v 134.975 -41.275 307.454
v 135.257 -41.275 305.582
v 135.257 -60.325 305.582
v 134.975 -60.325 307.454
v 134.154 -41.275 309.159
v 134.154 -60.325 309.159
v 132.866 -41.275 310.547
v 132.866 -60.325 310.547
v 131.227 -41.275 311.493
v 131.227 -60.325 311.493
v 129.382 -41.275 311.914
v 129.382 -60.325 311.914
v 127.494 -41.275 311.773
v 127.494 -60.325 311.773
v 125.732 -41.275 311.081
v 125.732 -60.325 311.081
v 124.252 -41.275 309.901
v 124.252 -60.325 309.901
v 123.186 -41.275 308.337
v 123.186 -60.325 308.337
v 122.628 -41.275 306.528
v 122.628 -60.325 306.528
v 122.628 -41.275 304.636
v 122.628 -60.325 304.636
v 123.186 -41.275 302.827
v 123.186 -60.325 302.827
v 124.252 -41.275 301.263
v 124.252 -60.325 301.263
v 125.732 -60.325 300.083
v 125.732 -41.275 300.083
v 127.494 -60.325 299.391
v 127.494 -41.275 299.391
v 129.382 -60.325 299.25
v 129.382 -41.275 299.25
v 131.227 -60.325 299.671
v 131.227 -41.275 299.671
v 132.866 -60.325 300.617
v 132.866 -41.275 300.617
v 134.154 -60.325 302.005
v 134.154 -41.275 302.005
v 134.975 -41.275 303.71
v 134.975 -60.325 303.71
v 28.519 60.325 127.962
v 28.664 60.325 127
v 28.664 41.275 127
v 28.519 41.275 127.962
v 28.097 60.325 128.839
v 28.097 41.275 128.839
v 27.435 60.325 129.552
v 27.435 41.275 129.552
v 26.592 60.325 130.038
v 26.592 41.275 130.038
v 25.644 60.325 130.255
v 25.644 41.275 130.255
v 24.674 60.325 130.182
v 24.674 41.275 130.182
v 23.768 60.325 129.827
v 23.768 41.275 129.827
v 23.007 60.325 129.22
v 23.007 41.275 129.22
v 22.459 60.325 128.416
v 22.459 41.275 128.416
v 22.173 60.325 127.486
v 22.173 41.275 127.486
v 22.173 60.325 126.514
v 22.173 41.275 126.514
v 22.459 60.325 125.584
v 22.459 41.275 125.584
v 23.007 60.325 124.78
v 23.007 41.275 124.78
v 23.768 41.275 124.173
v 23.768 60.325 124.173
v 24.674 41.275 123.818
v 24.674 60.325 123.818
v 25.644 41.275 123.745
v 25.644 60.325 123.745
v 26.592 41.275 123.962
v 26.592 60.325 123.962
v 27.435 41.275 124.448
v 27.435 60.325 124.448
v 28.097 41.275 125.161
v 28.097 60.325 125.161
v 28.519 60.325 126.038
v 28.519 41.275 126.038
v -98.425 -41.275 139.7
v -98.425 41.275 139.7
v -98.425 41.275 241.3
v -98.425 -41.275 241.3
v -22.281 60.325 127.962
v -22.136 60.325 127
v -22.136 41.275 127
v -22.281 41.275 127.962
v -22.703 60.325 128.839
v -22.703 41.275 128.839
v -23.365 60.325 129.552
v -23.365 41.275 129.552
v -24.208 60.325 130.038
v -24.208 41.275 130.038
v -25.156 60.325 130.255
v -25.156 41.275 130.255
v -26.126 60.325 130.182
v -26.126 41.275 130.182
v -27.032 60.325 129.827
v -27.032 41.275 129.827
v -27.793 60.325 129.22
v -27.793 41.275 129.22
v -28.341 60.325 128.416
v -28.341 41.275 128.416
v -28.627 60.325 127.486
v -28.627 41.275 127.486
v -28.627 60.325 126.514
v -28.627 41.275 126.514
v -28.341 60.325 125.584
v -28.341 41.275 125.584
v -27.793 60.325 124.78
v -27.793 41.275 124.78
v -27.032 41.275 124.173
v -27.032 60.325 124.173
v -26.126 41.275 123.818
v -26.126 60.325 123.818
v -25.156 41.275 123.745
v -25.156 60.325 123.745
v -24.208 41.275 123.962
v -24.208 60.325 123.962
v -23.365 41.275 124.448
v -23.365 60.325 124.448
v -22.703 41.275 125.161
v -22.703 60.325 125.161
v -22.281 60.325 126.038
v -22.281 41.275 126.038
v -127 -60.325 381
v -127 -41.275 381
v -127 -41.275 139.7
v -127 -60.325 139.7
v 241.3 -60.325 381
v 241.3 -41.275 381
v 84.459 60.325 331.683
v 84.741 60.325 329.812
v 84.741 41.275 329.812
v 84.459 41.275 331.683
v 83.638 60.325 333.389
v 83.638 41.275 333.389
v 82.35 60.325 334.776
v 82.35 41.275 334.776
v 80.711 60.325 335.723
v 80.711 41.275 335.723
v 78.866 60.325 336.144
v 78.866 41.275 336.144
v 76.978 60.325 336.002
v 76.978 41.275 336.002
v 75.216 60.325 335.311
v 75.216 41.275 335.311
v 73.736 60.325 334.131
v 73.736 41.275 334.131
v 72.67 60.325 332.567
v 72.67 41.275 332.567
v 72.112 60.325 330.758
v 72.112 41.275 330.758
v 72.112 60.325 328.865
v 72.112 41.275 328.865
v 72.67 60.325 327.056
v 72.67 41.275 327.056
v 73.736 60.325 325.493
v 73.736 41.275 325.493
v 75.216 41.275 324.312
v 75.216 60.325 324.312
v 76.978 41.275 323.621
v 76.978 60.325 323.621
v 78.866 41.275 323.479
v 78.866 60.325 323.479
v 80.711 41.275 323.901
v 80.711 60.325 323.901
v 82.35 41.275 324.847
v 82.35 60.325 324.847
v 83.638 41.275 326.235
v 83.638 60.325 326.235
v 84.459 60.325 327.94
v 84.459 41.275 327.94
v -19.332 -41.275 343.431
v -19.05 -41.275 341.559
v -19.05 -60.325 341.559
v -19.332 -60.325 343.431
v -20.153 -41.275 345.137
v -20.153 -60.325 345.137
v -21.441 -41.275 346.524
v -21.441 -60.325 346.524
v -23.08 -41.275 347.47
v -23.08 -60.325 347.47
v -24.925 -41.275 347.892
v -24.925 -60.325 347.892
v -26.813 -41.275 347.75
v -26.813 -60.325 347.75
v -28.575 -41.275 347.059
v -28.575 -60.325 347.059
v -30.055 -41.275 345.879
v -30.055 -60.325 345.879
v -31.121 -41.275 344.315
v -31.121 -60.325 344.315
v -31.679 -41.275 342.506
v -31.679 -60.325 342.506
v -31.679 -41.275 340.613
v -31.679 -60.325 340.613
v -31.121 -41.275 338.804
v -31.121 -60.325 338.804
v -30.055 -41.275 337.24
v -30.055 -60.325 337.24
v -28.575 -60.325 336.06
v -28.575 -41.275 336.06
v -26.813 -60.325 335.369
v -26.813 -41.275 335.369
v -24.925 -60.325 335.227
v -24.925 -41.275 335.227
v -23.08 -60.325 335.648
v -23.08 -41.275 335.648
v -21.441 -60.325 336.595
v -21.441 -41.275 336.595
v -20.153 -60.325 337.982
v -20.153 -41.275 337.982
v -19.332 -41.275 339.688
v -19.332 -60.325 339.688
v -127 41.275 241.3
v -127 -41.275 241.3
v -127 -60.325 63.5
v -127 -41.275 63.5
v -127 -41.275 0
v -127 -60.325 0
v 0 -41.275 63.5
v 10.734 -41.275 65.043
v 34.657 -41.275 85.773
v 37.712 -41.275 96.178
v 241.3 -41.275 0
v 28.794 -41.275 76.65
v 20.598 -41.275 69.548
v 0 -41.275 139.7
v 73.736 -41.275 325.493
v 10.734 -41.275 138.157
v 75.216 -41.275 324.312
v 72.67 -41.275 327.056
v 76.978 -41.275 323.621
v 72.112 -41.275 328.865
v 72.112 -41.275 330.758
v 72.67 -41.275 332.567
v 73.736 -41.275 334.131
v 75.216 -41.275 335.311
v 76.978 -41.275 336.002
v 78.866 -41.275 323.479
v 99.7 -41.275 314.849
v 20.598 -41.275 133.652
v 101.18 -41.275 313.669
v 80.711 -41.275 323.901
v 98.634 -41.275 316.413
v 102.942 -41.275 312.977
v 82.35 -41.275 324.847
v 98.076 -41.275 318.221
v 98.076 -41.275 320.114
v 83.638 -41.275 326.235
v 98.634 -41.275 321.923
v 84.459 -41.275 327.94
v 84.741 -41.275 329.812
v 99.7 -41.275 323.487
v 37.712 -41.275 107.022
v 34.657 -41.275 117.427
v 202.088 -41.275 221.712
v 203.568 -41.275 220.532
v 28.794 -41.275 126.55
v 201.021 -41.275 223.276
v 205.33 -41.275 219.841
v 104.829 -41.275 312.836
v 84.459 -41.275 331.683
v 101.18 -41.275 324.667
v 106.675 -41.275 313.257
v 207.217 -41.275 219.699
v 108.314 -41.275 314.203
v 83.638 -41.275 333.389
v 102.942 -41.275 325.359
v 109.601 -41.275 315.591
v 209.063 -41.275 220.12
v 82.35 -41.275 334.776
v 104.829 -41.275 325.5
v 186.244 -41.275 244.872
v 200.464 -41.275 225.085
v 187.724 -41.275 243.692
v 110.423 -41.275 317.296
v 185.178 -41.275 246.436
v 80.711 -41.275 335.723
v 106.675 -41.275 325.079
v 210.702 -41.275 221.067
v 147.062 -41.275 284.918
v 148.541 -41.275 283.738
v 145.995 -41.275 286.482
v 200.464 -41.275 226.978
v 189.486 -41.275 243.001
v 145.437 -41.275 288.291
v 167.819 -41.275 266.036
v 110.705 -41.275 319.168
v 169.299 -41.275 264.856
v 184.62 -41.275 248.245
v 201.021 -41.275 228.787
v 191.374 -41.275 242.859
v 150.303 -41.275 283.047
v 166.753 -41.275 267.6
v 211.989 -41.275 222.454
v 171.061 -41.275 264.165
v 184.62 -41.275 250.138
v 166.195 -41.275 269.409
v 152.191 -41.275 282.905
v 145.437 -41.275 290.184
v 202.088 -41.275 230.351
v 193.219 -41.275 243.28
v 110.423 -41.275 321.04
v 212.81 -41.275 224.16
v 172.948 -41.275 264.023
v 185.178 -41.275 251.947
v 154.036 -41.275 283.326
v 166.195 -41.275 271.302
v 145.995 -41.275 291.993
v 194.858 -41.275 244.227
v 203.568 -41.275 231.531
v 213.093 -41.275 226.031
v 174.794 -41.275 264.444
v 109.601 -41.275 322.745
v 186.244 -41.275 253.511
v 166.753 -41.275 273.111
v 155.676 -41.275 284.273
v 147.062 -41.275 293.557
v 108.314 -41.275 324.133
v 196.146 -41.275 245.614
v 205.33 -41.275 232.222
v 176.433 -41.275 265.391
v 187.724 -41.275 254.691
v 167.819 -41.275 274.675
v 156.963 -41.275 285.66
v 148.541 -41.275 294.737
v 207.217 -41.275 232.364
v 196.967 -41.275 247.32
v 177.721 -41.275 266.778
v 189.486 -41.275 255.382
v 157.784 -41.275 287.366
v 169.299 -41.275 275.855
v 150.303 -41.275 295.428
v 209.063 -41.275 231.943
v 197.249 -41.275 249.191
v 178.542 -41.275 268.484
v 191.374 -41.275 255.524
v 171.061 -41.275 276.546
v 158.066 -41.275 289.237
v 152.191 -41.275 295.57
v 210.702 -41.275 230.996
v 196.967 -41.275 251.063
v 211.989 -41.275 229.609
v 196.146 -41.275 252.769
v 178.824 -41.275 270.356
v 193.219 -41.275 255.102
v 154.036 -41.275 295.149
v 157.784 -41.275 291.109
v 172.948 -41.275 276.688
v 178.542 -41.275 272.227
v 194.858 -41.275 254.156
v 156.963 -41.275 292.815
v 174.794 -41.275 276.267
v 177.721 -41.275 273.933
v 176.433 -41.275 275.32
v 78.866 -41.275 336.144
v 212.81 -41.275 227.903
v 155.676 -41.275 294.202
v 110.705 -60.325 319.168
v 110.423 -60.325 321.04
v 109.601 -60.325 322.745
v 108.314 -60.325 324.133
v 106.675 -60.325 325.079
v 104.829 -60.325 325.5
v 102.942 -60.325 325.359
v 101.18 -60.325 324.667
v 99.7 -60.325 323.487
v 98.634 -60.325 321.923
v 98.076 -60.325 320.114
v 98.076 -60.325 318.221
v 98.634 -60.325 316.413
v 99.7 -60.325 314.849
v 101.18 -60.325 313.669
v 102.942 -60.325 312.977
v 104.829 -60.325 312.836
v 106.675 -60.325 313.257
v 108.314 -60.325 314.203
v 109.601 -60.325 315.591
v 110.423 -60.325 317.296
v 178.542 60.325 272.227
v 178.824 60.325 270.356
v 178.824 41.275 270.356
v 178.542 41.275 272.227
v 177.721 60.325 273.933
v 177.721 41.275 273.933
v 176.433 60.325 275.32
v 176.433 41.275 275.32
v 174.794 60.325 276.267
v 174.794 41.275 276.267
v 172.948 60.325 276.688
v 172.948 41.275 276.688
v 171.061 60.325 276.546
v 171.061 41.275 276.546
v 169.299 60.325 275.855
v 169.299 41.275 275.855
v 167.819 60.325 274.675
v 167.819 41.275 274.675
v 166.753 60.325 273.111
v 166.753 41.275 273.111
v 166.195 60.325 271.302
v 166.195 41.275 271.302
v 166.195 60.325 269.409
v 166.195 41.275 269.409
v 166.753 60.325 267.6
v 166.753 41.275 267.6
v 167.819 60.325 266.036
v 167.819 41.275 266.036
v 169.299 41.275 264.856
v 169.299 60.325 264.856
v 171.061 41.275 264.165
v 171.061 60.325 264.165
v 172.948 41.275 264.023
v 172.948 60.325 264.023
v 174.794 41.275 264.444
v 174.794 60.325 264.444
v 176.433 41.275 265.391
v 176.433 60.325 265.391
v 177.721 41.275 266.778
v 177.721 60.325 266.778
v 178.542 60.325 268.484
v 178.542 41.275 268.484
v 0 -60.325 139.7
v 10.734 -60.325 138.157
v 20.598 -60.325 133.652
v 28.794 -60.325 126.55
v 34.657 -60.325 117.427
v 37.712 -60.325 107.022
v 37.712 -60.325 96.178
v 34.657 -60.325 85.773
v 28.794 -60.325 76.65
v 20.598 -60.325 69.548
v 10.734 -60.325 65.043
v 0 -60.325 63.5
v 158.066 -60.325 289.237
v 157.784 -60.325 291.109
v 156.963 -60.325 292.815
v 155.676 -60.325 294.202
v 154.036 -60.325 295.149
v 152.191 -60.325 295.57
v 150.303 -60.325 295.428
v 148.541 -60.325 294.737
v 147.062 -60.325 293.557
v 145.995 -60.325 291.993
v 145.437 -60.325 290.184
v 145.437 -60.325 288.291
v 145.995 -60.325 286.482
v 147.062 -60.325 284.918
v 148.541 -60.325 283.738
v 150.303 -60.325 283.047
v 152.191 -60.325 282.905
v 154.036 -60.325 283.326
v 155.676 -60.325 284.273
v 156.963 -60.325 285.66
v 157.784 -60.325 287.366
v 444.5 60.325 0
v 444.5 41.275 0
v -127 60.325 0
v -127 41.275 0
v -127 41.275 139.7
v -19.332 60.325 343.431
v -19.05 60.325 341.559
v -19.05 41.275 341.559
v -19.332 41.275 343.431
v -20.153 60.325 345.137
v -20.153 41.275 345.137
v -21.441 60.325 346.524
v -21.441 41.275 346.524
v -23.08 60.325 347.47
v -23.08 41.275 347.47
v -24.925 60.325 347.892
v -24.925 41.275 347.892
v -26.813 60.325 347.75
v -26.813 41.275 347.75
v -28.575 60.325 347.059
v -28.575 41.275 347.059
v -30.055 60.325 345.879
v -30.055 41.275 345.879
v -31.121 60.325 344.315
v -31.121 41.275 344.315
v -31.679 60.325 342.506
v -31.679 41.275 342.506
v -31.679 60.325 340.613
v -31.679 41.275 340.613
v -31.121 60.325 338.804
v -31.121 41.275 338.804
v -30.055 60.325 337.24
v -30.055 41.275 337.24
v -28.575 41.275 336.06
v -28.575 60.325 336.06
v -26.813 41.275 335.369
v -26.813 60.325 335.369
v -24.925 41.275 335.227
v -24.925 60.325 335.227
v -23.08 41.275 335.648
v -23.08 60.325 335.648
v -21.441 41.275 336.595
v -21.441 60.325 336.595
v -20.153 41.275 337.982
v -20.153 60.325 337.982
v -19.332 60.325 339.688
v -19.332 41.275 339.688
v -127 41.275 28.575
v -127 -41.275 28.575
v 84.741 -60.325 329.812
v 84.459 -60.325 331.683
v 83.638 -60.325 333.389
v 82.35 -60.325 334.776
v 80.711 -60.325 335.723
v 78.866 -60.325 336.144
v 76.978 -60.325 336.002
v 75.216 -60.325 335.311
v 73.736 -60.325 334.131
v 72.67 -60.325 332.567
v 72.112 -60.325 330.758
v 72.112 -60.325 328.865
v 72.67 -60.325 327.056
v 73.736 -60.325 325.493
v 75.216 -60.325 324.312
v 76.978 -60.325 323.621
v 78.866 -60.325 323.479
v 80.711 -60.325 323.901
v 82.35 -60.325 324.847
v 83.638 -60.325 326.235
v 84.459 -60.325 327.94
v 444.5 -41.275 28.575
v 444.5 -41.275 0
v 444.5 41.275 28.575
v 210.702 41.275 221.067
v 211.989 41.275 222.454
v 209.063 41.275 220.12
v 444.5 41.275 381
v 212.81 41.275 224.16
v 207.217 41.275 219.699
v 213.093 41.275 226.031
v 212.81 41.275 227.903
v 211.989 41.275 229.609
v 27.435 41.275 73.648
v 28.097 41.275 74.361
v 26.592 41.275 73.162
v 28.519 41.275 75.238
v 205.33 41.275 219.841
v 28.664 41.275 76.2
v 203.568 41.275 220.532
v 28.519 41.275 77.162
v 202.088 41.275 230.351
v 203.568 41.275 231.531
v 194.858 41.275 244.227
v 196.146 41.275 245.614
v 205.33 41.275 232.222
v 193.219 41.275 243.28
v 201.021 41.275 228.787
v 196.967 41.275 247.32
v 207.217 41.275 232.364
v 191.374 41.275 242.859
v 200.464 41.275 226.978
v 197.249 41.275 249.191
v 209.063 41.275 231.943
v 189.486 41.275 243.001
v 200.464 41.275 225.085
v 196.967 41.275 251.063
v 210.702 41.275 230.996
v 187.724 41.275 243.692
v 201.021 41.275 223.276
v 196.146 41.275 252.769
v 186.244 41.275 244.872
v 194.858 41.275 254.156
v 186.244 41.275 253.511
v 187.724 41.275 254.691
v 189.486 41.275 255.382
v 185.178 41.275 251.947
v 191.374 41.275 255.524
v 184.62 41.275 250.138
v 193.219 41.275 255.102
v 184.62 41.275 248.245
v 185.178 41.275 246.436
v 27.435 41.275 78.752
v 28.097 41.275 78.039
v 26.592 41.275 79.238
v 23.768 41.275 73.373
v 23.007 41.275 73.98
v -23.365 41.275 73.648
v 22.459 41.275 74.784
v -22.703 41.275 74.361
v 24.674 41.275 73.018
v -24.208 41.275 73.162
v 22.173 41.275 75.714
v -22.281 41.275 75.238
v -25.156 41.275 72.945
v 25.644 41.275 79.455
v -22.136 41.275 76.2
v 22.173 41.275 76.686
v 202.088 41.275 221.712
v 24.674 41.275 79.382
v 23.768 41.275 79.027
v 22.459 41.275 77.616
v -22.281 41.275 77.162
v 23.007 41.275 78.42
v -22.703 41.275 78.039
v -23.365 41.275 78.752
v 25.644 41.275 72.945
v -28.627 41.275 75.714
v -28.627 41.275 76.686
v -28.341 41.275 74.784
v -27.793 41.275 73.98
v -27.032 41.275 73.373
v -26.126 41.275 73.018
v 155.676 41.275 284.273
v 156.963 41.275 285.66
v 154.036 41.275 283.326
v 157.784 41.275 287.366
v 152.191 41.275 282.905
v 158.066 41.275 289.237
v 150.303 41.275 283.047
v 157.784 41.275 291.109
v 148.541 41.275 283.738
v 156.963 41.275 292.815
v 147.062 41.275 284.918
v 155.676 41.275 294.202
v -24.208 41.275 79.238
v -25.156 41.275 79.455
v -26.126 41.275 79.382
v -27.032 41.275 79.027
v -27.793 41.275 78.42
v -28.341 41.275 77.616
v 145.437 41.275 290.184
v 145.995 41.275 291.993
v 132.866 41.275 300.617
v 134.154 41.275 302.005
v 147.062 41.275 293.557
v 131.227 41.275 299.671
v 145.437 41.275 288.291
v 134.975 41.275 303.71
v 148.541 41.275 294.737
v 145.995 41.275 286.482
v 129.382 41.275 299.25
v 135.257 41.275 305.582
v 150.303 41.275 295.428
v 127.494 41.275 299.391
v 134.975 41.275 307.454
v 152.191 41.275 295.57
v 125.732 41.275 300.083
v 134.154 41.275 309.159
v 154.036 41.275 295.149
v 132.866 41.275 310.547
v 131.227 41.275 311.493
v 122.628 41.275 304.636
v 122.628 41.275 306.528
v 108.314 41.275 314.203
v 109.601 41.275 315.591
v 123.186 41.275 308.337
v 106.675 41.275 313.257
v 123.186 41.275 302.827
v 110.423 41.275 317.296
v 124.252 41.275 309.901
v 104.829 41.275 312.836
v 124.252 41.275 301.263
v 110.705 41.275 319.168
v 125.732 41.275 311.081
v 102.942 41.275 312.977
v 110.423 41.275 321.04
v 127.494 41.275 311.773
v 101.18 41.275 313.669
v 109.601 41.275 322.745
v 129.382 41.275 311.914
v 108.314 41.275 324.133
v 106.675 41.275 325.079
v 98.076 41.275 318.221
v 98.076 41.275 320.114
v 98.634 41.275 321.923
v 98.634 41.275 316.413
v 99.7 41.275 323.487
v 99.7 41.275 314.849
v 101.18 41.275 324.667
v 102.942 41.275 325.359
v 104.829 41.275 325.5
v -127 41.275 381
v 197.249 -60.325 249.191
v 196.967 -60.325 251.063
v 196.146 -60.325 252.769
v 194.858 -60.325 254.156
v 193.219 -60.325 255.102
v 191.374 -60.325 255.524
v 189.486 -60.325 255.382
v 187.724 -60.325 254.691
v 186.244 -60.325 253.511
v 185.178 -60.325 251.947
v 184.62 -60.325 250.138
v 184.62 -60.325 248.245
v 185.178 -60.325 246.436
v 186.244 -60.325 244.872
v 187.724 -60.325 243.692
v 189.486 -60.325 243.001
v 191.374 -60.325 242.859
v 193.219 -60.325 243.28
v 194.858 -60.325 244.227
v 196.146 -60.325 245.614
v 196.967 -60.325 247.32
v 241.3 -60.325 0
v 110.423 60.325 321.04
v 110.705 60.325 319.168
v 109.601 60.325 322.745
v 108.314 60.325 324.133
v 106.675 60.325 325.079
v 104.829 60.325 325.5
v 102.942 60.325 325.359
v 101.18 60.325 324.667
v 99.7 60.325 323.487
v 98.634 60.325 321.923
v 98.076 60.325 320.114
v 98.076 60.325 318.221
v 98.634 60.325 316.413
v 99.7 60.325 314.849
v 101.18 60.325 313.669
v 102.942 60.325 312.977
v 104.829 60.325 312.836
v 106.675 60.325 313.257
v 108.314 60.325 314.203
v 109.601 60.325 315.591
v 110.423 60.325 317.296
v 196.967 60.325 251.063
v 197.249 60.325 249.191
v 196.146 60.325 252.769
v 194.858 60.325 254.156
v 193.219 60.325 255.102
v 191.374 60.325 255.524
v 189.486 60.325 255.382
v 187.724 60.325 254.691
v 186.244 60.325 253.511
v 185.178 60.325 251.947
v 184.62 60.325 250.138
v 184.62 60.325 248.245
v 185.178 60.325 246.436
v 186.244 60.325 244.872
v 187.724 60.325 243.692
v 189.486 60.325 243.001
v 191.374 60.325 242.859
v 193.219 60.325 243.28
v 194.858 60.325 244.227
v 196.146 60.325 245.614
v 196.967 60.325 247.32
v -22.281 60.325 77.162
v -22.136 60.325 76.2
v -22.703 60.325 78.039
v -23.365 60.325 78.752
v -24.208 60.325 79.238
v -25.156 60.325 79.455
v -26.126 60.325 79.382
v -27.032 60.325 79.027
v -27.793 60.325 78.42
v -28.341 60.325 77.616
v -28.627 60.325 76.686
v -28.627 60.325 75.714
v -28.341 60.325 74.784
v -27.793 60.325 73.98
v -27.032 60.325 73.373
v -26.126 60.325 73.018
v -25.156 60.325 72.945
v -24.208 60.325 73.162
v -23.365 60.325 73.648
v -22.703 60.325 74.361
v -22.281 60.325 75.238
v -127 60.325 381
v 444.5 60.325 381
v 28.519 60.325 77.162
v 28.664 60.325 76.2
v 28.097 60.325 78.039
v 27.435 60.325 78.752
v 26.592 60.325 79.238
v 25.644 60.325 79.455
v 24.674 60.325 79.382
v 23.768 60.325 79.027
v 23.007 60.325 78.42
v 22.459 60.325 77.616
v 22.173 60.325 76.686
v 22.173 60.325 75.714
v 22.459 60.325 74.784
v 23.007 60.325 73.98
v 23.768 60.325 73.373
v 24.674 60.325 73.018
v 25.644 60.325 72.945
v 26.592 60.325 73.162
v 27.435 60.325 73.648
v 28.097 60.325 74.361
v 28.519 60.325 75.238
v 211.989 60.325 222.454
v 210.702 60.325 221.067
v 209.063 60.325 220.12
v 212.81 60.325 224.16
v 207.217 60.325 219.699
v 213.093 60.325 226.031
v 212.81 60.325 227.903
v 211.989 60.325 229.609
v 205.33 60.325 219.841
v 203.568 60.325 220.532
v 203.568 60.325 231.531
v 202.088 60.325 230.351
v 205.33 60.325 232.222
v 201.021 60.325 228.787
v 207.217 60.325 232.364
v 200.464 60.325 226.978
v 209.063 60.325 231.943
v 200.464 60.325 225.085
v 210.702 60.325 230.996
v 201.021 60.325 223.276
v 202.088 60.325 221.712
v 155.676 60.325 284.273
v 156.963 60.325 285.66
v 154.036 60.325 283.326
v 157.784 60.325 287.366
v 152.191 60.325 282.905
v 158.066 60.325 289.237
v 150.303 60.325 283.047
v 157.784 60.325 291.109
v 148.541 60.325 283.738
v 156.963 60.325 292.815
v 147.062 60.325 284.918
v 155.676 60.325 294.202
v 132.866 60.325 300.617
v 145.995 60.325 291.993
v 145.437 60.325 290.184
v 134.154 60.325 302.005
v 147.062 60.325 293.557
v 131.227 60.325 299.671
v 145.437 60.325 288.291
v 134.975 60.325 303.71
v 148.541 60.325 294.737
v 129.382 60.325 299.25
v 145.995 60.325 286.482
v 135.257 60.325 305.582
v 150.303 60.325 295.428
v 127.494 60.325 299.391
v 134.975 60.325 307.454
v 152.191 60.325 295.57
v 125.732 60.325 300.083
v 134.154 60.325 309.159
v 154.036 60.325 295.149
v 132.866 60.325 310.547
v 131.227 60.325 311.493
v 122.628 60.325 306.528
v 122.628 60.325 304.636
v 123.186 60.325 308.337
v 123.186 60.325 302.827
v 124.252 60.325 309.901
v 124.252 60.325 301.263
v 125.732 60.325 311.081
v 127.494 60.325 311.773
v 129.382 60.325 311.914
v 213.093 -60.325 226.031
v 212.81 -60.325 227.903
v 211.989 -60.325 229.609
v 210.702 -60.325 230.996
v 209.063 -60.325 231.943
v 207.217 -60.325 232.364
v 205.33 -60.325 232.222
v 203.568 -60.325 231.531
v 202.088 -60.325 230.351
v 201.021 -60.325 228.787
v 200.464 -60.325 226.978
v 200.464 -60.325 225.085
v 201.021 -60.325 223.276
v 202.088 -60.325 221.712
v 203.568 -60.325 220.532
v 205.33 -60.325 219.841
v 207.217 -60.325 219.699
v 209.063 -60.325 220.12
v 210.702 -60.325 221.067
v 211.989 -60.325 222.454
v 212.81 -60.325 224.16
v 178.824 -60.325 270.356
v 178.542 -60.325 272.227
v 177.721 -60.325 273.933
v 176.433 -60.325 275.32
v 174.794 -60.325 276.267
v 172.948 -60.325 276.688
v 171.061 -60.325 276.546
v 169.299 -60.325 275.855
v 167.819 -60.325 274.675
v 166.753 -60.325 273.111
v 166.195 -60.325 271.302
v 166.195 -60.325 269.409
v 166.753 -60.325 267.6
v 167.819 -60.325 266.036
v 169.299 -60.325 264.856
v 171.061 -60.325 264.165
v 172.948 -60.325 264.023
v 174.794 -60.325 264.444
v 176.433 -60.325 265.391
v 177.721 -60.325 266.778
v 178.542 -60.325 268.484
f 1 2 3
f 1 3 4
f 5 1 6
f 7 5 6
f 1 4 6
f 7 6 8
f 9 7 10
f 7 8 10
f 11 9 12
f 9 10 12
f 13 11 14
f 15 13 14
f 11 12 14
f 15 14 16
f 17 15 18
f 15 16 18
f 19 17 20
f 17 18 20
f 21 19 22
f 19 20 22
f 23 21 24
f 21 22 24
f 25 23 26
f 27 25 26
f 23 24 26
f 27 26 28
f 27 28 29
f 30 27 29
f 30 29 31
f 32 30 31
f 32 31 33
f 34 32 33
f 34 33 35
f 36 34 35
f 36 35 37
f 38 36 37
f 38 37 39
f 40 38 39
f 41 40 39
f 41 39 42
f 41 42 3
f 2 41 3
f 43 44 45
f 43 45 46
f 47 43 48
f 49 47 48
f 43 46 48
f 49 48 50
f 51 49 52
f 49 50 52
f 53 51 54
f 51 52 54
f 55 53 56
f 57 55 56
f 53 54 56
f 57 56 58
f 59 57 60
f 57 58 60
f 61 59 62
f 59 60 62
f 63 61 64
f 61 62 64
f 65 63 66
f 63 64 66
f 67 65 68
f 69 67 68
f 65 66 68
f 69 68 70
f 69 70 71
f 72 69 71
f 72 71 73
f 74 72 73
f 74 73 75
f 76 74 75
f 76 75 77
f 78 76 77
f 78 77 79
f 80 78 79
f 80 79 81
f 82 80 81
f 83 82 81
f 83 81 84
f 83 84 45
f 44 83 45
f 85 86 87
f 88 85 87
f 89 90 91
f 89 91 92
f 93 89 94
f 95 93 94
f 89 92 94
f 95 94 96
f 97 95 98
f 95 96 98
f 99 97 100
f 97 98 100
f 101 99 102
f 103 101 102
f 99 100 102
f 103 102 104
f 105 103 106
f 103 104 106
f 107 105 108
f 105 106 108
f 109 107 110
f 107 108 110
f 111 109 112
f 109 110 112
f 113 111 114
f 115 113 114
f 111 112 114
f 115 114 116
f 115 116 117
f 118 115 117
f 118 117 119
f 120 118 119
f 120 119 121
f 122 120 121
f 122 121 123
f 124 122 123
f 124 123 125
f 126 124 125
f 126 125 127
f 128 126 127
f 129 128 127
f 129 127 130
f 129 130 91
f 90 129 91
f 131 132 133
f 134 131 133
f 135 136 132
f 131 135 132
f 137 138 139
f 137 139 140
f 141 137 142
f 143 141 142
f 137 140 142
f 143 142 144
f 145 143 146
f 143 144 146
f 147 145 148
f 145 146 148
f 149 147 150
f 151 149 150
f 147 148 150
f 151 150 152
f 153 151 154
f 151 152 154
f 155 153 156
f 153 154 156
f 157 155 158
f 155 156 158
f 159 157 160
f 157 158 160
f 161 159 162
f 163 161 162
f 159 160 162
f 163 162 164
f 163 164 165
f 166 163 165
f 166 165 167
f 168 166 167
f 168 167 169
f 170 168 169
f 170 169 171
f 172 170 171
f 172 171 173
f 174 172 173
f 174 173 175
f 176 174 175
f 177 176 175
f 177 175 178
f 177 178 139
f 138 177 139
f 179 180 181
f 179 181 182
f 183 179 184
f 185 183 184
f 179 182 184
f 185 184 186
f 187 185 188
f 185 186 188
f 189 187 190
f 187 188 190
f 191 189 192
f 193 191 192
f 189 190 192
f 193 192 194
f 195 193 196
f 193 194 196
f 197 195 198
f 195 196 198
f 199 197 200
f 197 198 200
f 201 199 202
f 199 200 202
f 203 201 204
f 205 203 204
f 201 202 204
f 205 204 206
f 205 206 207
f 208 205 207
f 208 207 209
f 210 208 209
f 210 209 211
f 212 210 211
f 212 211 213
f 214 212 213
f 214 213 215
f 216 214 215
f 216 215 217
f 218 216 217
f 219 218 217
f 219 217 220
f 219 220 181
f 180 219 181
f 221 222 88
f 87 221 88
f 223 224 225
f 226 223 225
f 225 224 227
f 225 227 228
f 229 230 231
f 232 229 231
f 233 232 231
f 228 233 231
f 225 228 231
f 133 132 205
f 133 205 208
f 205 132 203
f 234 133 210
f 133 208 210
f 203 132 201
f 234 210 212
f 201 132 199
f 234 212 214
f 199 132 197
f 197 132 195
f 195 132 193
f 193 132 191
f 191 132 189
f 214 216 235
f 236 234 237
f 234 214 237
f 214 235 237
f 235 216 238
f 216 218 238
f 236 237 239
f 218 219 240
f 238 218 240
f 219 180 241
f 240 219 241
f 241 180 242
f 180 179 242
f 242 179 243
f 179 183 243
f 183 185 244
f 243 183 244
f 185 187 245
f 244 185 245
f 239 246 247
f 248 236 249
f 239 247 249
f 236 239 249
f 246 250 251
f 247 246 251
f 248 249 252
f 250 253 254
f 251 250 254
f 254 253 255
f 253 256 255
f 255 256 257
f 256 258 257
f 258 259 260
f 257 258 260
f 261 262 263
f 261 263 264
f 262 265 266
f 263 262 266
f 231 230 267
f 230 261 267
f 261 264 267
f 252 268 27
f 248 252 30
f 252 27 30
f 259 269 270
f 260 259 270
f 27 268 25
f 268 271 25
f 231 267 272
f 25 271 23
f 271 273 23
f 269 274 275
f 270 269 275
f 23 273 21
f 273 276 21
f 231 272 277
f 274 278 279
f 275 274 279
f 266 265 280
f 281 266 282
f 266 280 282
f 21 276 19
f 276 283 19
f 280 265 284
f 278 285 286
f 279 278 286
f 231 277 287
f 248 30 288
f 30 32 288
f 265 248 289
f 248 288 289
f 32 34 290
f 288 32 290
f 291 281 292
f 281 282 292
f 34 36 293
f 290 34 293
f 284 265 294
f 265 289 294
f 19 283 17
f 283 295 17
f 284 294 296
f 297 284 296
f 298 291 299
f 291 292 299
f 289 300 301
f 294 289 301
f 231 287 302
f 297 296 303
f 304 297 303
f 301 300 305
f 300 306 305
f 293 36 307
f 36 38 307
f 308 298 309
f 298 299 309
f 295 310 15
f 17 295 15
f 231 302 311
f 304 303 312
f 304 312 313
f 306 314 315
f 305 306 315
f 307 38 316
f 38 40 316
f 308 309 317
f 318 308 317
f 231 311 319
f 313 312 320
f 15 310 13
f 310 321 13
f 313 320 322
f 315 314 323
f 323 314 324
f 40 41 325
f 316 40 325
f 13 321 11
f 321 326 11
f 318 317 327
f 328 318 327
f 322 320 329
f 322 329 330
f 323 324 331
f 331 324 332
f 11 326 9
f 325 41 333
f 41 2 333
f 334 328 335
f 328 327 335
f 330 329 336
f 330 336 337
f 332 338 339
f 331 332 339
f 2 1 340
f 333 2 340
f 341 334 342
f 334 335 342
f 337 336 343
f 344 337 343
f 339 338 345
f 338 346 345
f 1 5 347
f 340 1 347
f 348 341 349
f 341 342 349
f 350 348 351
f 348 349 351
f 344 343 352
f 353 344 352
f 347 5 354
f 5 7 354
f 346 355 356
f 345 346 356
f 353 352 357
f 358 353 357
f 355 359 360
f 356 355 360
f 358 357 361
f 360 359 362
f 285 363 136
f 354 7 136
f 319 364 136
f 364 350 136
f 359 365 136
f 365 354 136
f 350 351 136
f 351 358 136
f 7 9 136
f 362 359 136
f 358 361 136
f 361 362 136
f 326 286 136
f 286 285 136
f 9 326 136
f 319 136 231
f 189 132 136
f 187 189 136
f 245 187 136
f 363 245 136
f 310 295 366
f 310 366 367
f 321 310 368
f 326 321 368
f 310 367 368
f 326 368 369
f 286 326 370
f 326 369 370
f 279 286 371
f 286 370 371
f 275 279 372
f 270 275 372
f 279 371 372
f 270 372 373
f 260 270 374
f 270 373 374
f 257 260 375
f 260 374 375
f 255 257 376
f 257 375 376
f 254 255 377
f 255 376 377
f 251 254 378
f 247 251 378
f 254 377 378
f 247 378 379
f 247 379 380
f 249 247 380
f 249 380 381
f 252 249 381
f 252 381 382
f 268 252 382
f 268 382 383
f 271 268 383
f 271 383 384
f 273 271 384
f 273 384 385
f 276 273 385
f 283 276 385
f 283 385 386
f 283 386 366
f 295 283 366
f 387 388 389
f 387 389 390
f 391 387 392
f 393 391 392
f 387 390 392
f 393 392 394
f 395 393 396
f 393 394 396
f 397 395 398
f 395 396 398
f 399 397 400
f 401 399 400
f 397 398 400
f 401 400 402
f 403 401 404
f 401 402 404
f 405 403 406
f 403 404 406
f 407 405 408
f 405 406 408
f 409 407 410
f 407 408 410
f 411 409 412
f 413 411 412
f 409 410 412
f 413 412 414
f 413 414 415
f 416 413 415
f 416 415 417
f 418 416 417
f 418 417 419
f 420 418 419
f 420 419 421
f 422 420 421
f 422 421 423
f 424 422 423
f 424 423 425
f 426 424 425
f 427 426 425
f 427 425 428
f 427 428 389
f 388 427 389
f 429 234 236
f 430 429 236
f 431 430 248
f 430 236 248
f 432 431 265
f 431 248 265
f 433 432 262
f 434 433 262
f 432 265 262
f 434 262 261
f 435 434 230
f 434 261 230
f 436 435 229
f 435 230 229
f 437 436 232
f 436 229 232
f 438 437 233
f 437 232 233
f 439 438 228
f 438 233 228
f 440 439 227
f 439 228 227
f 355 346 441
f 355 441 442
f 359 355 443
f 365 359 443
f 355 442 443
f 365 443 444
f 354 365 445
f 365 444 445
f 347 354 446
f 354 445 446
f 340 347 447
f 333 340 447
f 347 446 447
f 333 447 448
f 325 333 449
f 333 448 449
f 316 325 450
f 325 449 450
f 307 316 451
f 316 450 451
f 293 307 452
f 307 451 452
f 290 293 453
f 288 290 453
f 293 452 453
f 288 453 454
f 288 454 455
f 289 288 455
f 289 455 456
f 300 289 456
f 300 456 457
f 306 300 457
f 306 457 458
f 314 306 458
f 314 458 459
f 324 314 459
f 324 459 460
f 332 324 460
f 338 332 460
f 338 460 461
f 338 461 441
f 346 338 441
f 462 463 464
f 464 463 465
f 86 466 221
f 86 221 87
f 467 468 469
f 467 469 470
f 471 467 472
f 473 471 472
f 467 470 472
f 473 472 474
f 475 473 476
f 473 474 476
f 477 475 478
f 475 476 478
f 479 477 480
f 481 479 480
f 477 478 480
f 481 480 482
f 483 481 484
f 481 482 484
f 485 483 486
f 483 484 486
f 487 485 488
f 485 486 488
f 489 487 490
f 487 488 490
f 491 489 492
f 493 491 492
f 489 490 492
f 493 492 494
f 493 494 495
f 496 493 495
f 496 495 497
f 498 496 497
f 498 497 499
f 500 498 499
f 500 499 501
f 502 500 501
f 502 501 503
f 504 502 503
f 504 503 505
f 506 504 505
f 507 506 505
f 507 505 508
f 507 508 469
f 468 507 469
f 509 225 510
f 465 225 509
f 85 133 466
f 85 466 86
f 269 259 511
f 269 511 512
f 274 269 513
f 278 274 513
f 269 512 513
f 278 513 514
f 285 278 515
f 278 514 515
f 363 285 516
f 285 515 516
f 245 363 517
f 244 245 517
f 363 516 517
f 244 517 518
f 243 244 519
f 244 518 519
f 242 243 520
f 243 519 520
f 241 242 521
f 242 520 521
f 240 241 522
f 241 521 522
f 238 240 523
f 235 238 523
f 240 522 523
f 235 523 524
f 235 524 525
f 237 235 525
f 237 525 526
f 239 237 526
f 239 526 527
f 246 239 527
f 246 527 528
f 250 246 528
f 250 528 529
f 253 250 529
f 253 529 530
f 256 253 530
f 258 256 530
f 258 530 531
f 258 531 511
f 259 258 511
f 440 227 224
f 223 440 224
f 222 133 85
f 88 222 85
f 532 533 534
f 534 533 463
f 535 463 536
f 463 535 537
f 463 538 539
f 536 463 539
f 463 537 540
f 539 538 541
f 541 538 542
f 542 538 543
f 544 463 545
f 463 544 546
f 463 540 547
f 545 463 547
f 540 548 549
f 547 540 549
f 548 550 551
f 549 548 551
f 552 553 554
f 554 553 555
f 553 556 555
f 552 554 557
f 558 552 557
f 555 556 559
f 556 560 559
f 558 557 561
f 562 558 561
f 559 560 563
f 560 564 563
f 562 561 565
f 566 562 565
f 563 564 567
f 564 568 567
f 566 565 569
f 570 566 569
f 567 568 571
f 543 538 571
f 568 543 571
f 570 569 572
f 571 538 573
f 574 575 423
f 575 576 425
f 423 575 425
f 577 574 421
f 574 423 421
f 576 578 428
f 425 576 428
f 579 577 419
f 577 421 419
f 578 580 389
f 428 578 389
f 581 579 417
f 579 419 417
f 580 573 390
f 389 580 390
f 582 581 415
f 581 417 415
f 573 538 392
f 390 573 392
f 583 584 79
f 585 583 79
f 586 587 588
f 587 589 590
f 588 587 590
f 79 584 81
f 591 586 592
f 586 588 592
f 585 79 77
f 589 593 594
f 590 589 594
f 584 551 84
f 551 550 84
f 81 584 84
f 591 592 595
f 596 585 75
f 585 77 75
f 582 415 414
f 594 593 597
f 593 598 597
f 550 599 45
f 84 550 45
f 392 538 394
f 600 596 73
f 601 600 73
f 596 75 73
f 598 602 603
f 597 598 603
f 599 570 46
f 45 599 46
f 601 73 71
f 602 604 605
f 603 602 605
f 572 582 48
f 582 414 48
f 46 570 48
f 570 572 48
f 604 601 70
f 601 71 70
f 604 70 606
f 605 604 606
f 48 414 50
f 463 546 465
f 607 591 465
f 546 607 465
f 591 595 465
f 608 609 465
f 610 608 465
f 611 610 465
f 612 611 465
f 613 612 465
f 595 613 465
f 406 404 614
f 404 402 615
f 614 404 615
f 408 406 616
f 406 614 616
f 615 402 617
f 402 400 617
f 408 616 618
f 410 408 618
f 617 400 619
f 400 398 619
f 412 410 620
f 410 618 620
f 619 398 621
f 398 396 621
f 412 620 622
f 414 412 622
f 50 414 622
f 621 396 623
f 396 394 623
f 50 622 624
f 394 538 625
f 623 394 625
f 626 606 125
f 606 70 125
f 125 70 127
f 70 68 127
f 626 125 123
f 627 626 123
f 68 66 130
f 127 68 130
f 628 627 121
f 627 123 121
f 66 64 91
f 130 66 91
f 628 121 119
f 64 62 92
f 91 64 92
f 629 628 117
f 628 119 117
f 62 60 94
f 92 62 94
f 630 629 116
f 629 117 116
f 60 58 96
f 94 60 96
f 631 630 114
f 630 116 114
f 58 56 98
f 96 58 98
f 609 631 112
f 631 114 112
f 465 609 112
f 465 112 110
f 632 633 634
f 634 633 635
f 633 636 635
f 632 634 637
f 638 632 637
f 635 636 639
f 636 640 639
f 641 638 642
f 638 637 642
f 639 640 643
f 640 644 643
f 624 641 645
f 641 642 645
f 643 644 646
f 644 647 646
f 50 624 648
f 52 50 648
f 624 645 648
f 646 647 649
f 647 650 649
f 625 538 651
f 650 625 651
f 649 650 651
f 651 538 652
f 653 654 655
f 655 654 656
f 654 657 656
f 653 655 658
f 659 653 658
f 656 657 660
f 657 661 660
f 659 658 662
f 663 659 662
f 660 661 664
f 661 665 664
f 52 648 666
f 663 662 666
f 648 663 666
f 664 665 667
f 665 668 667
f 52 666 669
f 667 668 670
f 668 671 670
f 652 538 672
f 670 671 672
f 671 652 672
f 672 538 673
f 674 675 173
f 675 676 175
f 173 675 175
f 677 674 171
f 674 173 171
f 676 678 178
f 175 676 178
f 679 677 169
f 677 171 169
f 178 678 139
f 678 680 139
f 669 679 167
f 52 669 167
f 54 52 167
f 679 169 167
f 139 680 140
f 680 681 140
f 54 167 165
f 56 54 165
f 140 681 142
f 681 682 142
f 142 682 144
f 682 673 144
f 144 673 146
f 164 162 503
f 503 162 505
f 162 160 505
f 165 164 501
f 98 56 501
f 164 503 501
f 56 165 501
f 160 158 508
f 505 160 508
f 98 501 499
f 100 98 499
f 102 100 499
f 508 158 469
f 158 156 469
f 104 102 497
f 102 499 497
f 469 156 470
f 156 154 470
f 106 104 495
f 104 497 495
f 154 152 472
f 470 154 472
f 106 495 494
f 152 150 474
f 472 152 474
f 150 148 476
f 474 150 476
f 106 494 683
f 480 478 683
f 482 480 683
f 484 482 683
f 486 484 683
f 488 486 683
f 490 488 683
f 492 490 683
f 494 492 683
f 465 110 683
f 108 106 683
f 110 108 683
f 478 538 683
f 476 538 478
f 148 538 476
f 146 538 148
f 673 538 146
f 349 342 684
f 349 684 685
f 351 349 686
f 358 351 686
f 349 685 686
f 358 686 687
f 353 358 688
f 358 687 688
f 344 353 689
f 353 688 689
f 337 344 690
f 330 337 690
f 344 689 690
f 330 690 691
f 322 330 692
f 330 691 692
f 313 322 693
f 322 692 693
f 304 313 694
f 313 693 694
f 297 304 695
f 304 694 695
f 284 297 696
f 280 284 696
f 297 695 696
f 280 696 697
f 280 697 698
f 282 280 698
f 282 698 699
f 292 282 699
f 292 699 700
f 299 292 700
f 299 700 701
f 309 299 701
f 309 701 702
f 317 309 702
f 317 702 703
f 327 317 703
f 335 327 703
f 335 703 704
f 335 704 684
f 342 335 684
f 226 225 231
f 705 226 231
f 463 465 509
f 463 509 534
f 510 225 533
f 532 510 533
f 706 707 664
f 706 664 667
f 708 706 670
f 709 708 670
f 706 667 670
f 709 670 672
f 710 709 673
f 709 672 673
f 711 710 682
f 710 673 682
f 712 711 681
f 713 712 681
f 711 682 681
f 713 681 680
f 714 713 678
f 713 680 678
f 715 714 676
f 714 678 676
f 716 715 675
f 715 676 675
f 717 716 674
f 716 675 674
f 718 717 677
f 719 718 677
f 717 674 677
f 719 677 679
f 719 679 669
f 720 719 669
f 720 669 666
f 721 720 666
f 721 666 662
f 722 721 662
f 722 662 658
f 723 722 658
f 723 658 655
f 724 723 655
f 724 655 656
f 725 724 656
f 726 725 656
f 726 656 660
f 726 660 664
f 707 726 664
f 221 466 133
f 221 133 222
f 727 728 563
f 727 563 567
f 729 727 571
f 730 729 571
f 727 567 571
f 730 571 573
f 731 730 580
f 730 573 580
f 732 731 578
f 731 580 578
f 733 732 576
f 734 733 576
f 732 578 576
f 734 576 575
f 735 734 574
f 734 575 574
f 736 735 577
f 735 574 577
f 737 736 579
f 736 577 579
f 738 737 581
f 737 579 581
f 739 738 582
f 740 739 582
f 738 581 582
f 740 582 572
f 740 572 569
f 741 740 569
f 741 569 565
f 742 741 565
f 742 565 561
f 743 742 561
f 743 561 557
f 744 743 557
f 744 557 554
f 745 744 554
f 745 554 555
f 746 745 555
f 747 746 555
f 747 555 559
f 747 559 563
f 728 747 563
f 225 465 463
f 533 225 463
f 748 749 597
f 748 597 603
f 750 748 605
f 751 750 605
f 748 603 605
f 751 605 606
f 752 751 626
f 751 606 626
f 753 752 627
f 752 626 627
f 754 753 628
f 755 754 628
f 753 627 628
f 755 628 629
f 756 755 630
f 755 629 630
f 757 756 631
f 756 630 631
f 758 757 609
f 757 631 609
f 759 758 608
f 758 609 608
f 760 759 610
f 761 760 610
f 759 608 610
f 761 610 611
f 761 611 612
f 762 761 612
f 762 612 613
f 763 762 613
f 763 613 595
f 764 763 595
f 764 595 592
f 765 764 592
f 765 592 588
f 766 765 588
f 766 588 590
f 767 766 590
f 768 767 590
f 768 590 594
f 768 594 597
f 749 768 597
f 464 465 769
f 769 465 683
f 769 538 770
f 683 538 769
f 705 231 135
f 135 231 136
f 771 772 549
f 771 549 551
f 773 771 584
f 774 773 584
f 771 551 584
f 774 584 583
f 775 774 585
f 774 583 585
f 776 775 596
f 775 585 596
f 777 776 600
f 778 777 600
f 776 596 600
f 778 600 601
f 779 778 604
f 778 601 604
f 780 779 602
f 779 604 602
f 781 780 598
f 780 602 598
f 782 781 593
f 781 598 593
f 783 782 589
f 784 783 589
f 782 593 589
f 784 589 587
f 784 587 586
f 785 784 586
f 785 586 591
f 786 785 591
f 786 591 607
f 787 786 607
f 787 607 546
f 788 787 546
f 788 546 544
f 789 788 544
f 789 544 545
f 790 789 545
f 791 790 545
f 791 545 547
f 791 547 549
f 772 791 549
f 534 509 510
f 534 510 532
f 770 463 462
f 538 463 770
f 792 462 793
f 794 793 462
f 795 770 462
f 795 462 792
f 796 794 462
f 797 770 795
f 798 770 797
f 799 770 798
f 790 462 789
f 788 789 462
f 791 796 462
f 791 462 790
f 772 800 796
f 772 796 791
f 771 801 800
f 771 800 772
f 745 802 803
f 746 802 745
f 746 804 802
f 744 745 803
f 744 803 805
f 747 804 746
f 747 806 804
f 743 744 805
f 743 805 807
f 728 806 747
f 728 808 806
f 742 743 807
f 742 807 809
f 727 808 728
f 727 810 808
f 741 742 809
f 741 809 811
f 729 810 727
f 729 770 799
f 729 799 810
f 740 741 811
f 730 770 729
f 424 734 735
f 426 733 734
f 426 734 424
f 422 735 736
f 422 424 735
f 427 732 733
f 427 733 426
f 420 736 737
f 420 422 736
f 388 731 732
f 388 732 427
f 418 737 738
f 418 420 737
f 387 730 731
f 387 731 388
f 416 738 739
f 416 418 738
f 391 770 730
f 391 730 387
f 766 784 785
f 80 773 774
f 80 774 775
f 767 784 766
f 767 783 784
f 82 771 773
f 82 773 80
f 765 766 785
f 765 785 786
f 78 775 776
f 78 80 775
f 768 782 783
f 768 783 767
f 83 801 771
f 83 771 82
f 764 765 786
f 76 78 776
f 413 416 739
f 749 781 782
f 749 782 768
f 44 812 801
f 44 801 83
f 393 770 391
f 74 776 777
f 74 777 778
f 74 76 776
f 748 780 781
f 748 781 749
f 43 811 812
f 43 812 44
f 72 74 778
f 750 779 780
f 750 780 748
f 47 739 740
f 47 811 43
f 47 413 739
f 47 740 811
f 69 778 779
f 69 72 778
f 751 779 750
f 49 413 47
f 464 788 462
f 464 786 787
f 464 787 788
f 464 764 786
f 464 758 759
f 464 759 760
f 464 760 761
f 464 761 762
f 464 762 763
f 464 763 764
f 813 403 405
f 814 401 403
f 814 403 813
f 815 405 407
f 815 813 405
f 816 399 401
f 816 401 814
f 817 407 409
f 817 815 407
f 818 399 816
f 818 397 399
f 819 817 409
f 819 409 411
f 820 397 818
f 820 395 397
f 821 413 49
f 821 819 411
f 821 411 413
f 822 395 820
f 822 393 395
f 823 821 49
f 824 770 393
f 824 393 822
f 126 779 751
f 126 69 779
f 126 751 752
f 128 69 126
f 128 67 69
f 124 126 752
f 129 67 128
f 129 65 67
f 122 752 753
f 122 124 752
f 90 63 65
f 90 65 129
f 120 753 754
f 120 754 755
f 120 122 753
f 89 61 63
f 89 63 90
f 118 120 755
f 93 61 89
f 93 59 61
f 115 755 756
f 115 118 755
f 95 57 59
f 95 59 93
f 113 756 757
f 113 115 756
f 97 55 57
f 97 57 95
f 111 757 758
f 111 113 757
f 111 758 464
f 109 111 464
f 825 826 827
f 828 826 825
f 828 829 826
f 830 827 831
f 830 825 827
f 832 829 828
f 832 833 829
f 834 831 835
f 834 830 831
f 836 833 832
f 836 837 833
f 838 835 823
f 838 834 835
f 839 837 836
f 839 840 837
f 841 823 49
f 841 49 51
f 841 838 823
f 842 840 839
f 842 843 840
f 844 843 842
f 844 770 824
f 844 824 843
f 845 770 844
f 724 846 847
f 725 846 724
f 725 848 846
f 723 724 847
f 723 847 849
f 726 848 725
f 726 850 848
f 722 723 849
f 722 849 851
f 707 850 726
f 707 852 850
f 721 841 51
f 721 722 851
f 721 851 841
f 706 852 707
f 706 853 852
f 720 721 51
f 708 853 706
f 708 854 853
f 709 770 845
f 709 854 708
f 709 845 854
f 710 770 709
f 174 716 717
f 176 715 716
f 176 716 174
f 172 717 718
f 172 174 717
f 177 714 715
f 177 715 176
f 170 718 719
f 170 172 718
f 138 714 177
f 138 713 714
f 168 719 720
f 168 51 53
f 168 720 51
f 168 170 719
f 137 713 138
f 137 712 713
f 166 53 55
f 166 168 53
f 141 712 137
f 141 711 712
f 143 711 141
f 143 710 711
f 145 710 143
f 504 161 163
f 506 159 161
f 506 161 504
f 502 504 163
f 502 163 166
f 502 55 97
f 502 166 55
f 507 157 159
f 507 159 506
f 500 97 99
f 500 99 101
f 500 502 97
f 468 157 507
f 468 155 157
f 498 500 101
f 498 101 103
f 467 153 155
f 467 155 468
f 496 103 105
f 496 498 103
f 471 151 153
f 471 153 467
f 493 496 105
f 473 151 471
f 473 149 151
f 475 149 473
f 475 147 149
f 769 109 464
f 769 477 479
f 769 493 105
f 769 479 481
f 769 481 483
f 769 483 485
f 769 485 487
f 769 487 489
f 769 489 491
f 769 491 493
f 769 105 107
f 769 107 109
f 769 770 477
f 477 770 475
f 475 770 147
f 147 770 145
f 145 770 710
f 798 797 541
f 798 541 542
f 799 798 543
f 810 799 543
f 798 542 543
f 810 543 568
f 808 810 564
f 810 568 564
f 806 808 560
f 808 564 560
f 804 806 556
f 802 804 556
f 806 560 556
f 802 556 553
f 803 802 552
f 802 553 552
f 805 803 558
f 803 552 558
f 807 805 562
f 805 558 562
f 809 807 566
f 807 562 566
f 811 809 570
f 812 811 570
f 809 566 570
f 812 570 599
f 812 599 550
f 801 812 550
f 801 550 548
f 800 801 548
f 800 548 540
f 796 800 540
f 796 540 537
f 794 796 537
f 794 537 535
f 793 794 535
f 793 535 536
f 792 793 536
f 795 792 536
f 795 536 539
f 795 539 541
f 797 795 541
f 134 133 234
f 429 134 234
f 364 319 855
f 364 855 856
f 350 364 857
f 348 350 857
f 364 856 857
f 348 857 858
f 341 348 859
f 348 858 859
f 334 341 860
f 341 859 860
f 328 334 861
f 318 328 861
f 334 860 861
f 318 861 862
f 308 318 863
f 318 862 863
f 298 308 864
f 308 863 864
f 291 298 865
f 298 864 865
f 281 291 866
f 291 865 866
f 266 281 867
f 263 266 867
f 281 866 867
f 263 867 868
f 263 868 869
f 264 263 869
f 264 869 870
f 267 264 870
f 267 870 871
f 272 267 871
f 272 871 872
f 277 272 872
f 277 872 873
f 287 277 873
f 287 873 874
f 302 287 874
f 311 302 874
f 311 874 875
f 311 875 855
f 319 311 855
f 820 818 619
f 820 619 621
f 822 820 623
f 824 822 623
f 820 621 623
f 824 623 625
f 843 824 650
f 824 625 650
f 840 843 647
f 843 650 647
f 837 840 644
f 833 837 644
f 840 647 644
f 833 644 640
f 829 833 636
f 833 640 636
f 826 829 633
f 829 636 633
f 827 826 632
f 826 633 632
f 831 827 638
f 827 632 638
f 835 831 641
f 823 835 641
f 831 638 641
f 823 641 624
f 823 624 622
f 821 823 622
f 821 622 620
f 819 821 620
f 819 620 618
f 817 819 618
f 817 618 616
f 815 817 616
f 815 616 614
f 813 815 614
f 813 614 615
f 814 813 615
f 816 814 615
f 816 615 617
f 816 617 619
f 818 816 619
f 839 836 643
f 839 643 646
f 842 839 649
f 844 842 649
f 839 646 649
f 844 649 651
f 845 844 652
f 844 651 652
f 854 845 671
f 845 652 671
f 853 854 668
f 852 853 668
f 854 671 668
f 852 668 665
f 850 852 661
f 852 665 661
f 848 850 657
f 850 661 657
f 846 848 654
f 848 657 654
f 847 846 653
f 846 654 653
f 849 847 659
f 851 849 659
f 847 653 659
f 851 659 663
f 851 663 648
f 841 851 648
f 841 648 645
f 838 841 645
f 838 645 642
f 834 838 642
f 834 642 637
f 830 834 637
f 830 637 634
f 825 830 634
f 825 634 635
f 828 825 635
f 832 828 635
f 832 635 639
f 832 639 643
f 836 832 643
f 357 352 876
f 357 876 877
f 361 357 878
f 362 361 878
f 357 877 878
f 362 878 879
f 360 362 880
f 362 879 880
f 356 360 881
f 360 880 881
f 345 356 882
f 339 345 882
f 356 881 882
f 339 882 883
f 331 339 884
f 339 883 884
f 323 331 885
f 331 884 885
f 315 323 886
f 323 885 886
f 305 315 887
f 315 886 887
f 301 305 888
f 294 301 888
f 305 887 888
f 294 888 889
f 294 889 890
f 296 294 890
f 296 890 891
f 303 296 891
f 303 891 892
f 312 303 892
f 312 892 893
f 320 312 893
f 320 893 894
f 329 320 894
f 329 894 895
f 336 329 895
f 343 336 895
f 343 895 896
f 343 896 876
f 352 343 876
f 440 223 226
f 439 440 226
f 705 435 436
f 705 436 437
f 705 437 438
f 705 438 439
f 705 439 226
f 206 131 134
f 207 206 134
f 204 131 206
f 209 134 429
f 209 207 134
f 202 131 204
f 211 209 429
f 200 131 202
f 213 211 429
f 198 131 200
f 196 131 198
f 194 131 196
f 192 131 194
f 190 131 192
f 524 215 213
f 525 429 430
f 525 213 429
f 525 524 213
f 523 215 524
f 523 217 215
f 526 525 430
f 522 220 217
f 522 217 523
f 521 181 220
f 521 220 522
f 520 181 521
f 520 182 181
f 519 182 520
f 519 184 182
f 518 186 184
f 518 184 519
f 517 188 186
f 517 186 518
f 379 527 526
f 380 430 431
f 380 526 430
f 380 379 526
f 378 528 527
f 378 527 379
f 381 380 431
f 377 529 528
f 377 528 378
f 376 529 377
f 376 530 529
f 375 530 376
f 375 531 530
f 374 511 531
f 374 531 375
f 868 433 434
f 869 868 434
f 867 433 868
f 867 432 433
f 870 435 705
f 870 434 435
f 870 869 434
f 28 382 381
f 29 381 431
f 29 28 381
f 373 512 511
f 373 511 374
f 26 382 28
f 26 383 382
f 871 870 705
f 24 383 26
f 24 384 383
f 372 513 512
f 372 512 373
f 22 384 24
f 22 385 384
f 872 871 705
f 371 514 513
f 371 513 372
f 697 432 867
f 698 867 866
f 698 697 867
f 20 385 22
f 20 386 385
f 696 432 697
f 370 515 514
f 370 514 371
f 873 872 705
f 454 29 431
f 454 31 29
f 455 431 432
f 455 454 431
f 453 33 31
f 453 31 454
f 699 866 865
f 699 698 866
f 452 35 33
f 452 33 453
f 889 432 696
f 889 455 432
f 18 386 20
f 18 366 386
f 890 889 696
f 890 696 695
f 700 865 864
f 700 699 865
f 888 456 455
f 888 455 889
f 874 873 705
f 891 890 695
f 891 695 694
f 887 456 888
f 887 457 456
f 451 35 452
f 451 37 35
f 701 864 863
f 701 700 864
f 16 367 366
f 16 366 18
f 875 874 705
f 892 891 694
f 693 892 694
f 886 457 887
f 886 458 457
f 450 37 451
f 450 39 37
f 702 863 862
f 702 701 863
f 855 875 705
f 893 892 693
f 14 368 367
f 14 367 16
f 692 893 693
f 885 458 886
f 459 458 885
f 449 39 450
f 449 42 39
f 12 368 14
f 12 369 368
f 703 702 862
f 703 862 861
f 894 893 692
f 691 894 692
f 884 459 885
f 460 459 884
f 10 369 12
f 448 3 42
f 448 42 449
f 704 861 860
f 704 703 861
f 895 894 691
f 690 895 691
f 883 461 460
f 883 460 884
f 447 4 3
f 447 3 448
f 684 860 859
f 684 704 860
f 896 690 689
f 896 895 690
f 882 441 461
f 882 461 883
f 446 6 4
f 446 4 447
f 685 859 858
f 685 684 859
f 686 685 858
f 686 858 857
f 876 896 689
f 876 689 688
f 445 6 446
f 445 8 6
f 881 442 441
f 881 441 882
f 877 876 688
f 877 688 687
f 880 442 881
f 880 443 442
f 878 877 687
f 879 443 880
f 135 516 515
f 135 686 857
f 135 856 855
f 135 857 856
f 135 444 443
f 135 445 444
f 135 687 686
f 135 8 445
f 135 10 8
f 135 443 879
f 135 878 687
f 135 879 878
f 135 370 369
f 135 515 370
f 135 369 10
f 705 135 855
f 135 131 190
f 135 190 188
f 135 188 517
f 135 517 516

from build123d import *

# Parameters (mm, degrees)
F0_W      = 571.5
F0_H      = 82.55
F1_DEPTH  = 28.575
F3_DEPTH  = 19.05
F4_W      = 571.5
F4_H      = 381
F5_DEPTH  = 19.05
F6_R      = 3.2639
F7_DEPTH  = 25.4
F8_W      = 28.575
F8_H      = 101.6
F9_DEPTH  = 82.55
F11_R     = 6.35
F12_DEPTH = 25.4
F13_R     = 6.35
F14_DEPTH = 25.4


with BuildPart() as f1:
    # F0 (on Top) → F1 (new body)
    with BuildSketch(Plane.XY):
        with Locations((158.75, 0)):
            Rectangle(F0_W, F0_H)
    extrude(amount=F1_DEPTH)


with BuildPart() as f3:
    # F2 (on face) → F3 (new body)
    with BuildSketch(Plane.XZ.offset(41.275)):
        with BuildLine():
            Line((-127, 63.5), (-127, 0))
            Line((-127, 0), (241.3, 0))
            Line((241.3, 0), (241.3, 381))
            Line((241.3, 381), (-127, 381))
            Line((-127, 381), (-127, 139.7))
            Line((-127, 139.7), (0, 139.7))
            ThreePointArc((0, 139.7), (38.1, 101.6), (0, 63.5))
            Line((0, 63.5), (-127, 63.5))
        make_face()
    extrude(amount=F3_DEPTH)

    # F11 (on face) → F12 (cut)
    with BuildSketch(Plane.XZ.offset(60.325)):
        with Locations((151.716432, 289.237457)):
            Circle(F11_R)
        with Locations((128.907201, 305.581922)):
            Circle(F11_R)
        with Locations((104.354721, 319.167882)):
            Circle(F11_R)
        with Locations((78.391022, 329.811609)):
            Circle(F11_R)
        with Locations((172.473959, 270.355516)):
            Circle(F11_R)
        with Locations((190.899071, 249.191448)):
            Circle(F11_R)
        with Locations((206.742601, 226.031457)):
            Circle(F11_R)
        with Locations((-25.4, 341.559434)):
            Circle(F11_R)
    extrude(amount=-F12_DEPTH, mode=Mode.SUBTRACT)


with BuildPart() as f5:
    # F4 (on face) → F5 (new body)
    with BuildSketch(Plane(origin=(0, 41.275, 0), x_dir=(-1, 0, 0), z_dir=(0, 1, 0))):
        with Locations((-158.75, 190.5)):
            Rectangle(F4_W, F4_H)
    extrude(amount=F5_DEPTH)

    # F6 (on face) → F7 (cut)
    with BuildSketch(Plane.XZ.offset(-41.275)):
        with Locations((-25.4, 127)):
            Circle(F6_R)
        with Locations((25.4, 127)):
            Circle(F6_R)
        with Locations((-25.4, 76.2)):
            Circle(F6_R)
        with Locations((25.4, 76.2)):
            Circle(F6_R)
    extrude(amount=-F7_DEPTH, mode=Mode.SUBTRACT)

    # F13 (on face) → F14 (cut)
    with BuildSketch(Plane.XZ.offset(-41.275)):
        with Locations((-25.4, 341.559434)):
            Circle(F13_R)
        with Locations((78.391022, 329.811609)):
            Circle(F13_R)
        with Locations((104.354721, 319.167882)):
            Circle(F13_R)
        with Locations((128.907201, 305.581922)):
            Circle(F13_R)
        with Locations((151.716432, 289.237457)):
            Circle(F13_R)
        with Locations((172.473959, 270.355516)):
            Circle(F13_R)
        with Locations((190.899071, 249.191448)):
            Circle(F13_R)
        with Locations((206.742601, 226.031457)):
            Circle(F13_R)
    extrude(amount=-F14_DEPTH, mode=Mode.SUBTRACT)


with BuildPart() as f9:
    # F8 (on face) → F9 (new body, through all)
    with BuildSketch(Plane.XZ.offset(-41.275)):
        with Locations((-112.7125, 190.5)):
            Rectangle(F8_W, F8_H)
    extrude(amount=F9_DEPTH)


solid = Compound([f1.part, f3.part, f5.part, f9.part])
